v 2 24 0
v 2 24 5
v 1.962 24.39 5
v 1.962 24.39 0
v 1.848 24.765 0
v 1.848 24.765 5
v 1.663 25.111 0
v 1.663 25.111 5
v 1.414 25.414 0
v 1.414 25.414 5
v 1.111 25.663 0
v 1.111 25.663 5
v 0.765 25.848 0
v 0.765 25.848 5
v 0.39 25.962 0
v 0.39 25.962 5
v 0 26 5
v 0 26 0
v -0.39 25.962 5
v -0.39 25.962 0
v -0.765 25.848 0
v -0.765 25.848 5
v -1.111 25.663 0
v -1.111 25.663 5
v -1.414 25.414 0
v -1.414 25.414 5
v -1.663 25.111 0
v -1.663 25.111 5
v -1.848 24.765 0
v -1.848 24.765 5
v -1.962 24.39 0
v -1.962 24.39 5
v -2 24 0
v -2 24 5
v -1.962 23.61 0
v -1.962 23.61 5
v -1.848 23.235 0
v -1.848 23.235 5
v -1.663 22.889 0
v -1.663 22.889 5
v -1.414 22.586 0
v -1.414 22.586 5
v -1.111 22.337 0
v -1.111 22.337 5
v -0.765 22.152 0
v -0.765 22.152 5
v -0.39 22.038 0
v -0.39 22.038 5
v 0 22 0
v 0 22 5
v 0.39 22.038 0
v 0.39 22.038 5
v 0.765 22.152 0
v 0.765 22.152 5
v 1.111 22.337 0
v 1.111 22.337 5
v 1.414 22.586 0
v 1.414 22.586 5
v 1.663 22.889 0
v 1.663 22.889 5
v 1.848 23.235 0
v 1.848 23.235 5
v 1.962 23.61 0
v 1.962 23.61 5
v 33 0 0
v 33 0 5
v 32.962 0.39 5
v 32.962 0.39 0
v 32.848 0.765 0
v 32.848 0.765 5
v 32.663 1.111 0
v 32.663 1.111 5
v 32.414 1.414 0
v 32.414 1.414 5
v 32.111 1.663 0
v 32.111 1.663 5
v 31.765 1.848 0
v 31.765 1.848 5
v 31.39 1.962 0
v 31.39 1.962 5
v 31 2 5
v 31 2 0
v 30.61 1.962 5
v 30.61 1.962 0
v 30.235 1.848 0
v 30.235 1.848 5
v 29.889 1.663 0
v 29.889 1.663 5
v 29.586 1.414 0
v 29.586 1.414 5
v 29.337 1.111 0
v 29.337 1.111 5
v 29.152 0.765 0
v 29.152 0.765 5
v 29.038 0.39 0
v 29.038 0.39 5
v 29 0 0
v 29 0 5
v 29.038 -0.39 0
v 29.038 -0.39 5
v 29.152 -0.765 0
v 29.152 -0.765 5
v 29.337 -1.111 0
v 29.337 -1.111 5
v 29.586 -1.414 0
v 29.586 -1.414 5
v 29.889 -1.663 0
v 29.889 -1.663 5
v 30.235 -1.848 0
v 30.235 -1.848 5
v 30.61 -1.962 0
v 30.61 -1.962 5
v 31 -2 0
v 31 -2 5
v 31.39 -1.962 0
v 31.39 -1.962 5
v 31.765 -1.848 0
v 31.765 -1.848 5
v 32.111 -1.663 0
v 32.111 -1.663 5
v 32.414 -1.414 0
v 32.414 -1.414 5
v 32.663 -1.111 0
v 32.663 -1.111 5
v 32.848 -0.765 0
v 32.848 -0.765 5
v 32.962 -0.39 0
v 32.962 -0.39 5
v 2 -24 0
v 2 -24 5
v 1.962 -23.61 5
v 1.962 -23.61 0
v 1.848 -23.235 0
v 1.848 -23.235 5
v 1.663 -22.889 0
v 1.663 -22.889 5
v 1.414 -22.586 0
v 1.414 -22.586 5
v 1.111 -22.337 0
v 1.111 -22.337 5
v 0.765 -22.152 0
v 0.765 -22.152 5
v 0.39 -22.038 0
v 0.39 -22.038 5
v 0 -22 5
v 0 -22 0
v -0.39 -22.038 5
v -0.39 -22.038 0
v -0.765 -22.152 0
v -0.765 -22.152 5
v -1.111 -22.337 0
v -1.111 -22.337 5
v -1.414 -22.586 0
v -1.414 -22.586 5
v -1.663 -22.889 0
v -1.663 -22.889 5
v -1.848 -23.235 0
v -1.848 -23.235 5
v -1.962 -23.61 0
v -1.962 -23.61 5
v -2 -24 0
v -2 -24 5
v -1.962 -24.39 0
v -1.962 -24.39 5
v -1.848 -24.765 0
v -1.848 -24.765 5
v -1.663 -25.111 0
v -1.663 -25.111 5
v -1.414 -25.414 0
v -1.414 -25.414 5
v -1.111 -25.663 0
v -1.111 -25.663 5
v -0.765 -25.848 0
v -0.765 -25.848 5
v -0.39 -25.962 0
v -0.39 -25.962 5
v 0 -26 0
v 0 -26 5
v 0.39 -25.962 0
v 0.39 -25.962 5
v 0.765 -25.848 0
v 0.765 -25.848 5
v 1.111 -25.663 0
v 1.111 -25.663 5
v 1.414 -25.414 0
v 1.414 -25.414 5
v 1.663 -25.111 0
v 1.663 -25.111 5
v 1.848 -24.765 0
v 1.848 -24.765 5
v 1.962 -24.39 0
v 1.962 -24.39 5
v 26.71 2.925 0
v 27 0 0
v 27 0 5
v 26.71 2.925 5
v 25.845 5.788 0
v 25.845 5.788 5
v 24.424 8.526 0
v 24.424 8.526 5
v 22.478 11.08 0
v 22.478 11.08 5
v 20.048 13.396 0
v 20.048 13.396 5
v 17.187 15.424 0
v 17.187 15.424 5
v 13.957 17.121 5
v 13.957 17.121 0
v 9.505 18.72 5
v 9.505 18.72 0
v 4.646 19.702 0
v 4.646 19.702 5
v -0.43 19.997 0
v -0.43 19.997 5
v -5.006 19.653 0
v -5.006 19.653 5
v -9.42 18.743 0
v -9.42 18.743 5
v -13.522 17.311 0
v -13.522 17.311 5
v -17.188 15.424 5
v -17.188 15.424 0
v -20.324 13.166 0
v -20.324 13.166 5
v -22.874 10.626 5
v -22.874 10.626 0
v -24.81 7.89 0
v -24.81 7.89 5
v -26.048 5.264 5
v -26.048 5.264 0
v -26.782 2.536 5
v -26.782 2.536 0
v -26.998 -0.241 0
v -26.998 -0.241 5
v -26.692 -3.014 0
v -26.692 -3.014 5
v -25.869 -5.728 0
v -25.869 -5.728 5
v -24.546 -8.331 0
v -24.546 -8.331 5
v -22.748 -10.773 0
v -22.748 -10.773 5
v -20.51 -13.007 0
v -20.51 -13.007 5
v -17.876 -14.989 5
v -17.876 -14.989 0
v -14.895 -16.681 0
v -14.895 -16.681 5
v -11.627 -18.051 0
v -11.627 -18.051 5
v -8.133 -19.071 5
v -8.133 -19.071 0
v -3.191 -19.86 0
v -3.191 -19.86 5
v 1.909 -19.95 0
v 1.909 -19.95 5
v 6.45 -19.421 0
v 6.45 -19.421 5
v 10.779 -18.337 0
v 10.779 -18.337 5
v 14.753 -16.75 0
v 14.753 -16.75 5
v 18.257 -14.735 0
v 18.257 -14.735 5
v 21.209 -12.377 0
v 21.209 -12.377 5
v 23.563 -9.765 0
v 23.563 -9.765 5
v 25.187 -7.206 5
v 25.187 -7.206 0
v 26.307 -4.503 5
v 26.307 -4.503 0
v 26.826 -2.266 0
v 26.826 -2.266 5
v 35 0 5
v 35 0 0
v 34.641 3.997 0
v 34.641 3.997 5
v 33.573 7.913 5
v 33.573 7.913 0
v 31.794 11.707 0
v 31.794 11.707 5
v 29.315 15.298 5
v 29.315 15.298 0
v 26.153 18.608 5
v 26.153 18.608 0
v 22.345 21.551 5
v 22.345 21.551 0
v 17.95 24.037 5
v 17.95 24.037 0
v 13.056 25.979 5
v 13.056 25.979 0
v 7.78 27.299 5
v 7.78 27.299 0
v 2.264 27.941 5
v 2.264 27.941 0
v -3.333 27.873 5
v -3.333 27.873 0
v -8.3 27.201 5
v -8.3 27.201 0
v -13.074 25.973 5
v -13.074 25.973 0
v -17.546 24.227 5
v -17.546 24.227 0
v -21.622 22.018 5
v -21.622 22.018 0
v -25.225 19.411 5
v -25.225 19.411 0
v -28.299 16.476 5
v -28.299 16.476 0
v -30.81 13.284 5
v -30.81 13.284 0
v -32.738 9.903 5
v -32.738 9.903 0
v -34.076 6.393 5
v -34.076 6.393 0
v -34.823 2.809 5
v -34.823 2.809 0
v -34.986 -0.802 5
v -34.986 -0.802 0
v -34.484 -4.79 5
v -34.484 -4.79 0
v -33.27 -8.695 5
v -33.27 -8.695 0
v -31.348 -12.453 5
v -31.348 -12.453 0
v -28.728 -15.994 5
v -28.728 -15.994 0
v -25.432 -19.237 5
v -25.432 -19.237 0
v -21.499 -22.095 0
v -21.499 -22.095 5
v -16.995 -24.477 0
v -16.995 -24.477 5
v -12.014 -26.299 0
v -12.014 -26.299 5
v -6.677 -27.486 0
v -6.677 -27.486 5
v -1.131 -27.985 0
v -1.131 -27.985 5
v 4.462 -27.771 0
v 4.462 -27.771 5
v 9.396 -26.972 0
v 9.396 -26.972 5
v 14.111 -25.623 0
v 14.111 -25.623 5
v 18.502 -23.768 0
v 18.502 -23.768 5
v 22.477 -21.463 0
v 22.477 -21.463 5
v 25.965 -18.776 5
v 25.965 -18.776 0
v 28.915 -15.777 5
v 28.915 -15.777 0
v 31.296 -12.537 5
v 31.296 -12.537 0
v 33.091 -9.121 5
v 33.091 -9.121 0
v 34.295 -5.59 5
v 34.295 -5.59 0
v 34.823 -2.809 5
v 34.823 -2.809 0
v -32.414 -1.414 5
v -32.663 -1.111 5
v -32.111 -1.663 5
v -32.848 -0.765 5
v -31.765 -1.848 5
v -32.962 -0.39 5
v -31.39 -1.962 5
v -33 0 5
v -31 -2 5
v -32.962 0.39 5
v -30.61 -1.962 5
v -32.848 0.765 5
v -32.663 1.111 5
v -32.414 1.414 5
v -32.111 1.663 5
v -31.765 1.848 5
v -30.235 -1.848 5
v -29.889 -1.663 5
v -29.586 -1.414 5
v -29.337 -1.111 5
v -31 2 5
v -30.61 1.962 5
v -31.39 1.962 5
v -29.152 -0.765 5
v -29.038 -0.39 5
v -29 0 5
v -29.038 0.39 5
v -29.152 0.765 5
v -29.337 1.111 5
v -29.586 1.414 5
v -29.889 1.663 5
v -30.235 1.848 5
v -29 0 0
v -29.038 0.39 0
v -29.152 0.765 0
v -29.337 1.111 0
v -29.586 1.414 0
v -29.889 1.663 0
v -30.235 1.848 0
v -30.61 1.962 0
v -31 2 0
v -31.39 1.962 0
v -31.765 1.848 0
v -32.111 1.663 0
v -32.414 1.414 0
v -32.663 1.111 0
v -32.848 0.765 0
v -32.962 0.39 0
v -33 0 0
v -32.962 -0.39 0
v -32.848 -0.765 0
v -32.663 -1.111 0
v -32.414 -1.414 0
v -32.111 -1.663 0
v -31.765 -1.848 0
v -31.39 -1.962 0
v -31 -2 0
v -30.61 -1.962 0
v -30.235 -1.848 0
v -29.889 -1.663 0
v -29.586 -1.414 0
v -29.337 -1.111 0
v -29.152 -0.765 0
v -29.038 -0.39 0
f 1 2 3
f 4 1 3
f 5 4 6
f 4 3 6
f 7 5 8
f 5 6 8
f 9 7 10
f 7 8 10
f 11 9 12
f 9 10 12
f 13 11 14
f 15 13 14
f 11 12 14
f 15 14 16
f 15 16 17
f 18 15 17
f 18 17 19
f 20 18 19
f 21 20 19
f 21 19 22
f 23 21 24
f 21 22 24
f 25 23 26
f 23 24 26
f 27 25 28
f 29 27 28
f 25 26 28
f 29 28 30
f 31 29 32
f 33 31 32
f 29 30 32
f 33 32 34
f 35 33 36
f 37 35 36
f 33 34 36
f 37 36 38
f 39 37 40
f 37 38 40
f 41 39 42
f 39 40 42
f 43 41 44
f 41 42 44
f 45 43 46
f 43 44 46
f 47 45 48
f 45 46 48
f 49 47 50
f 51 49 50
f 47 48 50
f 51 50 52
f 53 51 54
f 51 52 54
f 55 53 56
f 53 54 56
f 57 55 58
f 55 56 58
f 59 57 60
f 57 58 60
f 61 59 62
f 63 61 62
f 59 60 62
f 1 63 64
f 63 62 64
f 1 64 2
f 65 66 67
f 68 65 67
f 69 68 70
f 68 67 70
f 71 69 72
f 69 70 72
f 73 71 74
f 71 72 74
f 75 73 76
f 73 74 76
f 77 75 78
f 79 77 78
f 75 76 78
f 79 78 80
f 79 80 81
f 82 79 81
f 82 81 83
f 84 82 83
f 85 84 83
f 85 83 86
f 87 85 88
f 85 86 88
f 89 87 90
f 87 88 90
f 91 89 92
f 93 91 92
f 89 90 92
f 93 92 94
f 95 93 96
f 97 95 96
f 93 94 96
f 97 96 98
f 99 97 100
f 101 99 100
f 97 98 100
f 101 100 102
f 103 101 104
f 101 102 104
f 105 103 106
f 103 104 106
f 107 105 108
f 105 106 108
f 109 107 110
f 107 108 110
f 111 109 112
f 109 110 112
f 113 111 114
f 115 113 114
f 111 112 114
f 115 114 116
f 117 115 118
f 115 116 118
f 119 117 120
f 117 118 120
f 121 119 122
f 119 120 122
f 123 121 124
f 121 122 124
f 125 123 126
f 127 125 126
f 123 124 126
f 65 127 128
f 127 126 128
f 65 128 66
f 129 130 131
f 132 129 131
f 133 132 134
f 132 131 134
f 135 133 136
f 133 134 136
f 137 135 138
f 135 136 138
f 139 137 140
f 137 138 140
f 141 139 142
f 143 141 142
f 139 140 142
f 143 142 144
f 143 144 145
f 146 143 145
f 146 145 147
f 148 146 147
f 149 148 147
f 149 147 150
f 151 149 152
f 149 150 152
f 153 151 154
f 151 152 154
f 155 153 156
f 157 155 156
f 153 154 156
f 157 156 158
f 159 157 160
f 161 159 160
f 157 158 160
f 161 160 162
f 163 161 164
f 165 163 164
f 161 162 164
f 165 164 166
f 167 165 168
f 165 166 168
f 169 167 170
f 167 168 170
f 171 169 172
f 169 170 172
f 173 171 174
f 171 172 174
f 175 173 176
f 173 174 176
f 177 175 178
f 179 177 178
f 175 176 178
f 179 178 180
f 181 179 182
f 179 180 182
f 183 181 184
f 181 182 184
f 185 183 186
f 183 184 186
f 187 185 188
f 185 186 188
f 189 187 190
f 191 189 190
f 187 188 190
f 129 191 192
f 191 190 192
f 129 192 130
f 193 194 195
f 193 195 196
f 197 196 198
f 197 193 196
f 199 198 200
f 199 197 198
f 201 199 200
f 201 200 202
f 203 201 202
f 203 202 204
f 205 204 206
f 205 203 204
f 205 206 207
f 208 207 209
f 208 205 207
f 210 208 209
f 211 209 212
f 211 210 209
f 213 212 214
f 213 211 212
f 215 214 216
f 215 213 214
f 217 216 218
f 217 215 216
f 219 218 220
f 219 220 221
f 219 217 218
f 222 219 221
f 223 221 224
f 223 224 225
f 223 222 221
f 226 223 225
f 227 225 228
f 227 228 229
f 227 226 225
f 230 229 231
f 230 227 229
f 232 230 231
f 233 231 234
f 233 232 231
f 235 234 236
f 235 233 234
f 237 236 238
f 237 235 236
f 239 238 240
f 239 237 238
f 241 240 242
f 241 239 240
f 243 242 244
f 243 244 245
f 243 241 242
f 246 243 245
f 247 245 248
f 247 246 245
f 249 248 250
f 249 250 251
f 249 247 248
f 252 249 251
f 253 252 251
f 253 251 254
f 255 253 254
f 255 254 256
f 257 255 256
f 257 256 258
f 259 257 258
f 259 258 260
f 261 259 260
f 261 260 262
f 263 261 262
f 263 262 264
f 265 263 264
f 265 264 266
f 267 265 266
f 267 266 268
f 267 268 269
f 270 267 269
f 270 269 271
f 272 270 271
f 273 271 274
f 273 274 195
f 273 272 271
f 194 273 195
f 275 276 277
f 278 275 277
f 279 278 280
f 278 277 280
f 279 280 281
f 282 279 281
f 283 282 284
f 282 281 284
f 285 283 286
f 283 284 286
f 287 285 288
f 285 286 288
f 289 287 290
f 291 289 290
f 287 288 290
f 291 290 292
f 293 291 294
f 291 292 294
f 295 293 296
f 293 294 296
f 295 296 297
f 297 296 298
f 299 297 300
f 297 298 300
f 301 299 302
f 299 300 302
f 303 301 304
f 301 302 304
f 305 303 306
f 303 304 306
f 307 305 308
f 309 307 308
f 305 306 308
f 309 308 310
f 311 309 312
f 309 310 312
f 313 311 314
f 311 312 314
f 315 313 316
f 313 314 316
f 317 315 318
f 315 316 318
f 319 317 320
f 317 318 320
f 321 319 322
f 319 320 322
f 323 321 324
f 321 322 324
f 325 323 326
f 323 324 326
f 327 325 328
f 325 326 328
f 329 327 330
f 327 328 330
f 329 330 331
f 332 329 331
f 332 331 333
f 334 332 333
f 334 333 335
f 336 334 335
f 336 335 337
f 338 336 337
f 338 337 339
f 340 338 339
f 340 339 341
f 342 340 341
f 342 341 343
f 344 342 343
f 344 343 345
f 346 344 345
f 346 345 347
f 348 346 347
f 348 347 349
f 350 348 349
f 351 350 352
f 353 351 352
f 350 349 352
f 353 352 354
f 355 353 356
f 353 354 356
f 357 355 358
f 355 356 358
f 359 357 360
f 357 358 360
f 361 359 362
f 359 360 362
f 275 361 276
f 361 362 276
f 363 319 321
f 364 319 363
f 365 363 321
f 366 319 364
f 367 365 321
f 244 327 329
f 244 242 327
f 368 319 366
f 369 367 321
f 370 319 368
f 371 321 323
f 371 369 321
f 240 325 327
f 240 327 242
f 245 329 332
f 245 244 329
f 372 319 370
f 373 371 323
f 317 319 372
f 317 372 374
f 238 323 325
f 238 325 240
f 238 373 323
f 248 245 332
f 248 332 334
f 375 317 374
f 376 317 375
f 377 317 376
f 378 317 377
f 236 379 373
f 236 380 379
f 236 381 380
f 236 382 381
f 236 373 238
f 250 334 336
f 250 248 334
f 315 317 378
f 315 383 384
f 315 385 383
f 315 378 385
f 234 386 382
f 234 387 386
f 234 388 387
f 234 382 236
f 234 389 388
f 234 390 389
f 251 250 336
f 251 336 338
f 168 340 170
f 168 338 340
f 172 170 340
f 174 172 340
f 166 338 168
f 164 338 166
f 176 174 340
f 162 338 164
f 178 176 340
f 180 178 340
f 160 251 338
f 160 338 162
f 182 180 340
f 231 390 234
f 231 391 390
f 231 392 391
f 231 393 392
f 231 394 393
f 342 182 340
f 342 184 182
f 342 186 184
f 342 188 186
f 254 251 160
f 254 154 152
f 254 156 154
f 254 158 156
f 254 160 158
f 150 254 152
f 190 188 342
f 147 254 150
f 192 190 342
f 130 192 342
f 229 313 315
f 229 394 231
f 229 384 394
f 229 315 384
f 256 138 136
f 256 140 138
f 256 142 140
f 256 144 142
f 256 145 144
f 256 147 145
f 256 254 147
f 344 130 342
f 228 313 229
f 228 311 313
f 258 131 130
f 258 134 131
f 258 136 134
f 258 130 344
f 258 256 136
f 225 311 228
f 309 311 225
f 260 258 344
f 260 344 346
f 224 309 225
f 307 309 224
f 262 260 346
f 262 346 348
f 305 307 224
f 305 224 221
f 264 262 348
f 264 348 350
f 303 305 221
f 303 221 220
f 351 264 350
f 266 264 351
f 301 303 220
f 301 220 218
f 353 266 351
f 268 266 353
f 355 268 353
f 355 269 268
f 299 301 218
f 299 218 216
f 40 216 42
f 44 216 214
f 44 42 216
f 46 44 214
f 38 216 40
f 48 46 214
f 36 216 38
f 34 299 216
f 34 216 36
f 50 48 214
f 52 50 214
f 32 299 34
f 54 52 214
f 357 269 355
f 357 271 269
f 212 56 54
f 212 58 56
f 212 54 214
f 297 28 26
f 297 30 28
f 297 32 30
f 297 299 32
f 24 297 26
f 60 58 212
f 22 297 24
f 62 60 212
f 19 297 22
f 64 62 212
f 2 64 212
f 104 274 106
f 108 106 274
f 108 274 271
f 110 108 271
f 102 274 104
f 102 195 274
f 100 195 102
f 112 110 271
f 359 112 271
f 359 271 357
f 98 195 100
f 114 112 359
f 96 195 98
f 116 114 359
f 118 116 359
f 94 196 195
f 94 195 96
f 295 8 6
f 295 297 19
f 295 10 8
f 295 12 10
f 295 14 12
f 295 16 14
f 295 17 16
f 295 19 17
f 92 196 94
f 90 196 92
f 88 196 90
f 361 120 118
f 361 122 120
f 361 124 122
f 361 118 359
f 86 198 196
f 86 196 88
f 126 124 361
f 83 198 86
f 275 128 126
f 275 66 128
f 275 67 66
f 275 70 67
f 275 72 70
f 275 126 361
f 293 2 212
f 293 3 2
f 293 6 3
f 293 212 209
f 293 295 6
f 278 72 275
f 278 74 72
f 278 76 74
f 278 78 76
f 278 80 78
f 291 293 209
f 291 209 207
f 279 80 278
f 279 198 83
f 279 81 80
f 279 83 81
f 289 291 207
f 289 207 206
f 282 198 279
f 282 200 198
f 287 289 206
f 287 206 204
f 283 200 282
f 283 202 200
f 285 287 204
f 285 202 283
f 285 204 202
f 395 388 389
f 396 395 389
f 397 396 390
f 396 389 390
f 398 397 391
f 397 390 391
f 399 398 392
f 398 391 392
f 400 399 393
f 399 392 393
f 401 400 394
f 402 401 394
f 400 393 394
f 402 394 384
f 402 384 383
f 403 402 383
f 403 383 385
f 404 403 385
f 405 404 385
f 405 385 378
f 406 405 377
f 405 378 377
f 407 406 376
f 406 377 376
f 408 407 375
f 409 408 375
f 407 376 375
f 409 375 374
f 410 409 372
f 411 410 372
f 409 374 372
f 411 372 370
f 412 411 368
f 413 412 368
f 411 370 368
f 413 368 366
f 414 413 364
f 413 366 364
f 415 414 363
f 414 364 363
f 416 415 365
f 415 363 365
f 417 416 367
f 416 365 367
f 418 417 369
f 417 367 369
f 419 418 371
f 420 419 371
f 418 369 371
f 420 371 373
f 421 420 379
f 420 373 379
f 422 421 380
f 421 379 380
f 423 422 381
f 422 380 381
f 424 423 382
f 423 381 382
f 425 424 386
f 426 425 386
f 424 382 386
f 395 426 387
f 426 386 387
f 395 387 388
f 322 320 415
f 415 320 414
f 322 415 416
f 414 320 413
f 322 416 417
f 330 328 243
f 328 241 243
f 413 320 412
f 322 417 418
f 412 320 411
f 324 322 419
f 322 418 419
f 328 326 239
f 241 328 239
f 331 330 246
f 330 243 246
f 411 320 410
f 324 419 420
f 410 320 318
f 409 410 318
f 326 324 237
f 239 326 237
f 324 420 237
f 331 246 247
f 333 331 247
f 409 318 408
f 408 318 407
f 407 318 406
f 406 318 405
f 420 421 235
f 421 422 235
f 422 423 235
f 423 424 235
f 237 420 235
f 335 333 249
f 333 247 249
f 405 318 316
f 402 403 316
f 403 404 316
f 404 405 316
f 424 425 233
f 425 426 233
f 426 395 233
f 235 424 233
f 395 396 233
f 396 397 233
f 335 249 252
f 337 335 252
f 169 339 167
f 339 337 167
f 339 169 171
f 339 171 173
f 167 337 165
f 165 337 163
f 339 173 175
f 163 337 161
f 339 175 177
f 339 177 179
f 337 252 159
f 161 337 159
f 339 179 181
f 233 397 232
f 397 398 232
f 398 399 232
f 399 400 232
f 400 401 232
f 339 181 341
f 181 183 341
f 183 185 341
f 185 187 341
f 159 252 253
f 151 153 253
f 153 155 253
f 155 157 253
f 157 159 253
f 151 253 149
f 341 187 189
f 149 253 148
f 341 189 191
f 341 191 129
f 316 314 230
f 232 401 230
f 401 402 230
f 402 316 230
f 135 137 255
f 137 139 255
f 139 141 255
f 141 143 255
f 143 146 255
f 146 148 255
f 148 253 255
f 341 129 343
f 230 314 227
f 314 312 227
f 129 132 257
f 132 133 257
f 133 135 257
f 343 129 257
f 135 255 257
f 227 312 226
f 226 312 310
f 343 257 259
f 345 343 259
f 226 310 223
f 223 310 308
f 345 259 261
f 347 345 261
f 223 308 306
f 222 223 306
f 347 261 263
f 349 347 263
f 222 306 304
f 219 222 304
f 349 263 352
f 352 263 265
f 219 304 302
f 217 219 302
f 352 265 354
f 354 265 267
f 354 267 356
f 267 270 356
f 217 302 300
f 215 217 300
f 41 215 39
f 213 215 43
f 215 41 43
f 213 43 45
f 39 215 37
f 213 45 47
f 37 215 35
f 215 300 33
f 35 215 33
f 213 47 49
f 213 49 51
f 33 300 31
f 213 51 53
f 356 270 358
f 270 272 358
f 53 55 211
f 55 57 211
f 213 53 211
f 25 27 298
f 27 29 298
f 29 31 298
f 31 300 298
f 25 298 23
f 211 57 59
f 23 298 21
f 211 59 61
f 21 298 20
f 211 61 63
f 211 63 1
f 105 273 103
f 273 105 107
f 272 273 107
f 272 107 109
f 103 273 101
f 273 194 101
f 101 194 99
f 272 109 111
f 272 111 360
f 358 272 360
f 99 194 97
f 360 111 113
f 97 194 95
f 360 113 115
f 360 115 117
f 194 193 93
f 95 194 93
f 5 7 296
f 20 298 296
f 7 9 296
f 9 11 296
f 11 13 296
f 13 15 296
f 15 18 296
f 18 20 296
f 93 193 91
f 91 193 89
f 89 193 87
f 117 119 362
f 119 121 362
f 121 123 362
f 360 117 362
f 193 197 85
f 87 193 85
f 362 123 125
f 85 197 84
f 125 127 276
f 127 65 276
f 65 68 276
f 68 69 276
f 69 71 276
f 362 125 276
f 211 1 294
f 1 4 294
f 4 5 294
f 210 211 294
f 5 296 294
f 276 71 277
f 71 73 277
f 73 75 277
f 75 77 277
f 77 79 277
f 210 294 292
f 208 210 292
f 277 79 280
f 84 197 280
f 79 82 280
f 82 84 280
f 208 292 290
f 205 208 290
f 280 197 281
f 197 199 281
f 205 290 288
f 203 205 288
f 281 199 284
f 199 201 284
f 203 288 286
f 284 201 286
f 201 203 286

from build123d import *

# Parameters (mm, degrees)
ESQUISSE1_RX            = 35
ESQUISSE1_RY            = 28
ESQUISSE1_RX_2          = 27
ESQUISSE1_RY_2          = 20
BOSS_EXTRU_1_DEPTH      = 5
ESQUISSE2_R             = 2
ENL_V_MAT_EXTRU_1_DEPTH = 5


with BuildPart() as part:
    # Esquisse1 → Boss.-Extru.1 (new body)
    with BuildSketch(Plane.XY):
        with Locations((0, 0)):
            Ellipse(ESQUISSE1_RX, ESQUISSE1_RY)
        with Locations((0, 0)):
            Ellipse(ESQUISSE1_RX_2, ESQUISSE1_RY_2, mode=Mode.SUBTRACT)
    extrude(amount=BOSS_EXTRU_1_DEPTH)

    # Esquisse2 → Enlèv. mat.-Extru.1 (cut)
    with BuildSketch(Plane.XY.offset(5)):
        with Locations((-31, 0)):
            Circle(ESQUISSE2_R)
        with Locations((0, 24)):
            Circle(ESQUISSE2_R)
        with Locations((31, 0)):
            Circle(ESQUISSE2_R)
        with Locations((0, -24)):
            Circle(ESQUISSE2_R)
    extrude(amount=-ENL_V_MAT_EXTRU_1_DEPTH, mode=Mode.SUBTRACT)


solid = part.part
